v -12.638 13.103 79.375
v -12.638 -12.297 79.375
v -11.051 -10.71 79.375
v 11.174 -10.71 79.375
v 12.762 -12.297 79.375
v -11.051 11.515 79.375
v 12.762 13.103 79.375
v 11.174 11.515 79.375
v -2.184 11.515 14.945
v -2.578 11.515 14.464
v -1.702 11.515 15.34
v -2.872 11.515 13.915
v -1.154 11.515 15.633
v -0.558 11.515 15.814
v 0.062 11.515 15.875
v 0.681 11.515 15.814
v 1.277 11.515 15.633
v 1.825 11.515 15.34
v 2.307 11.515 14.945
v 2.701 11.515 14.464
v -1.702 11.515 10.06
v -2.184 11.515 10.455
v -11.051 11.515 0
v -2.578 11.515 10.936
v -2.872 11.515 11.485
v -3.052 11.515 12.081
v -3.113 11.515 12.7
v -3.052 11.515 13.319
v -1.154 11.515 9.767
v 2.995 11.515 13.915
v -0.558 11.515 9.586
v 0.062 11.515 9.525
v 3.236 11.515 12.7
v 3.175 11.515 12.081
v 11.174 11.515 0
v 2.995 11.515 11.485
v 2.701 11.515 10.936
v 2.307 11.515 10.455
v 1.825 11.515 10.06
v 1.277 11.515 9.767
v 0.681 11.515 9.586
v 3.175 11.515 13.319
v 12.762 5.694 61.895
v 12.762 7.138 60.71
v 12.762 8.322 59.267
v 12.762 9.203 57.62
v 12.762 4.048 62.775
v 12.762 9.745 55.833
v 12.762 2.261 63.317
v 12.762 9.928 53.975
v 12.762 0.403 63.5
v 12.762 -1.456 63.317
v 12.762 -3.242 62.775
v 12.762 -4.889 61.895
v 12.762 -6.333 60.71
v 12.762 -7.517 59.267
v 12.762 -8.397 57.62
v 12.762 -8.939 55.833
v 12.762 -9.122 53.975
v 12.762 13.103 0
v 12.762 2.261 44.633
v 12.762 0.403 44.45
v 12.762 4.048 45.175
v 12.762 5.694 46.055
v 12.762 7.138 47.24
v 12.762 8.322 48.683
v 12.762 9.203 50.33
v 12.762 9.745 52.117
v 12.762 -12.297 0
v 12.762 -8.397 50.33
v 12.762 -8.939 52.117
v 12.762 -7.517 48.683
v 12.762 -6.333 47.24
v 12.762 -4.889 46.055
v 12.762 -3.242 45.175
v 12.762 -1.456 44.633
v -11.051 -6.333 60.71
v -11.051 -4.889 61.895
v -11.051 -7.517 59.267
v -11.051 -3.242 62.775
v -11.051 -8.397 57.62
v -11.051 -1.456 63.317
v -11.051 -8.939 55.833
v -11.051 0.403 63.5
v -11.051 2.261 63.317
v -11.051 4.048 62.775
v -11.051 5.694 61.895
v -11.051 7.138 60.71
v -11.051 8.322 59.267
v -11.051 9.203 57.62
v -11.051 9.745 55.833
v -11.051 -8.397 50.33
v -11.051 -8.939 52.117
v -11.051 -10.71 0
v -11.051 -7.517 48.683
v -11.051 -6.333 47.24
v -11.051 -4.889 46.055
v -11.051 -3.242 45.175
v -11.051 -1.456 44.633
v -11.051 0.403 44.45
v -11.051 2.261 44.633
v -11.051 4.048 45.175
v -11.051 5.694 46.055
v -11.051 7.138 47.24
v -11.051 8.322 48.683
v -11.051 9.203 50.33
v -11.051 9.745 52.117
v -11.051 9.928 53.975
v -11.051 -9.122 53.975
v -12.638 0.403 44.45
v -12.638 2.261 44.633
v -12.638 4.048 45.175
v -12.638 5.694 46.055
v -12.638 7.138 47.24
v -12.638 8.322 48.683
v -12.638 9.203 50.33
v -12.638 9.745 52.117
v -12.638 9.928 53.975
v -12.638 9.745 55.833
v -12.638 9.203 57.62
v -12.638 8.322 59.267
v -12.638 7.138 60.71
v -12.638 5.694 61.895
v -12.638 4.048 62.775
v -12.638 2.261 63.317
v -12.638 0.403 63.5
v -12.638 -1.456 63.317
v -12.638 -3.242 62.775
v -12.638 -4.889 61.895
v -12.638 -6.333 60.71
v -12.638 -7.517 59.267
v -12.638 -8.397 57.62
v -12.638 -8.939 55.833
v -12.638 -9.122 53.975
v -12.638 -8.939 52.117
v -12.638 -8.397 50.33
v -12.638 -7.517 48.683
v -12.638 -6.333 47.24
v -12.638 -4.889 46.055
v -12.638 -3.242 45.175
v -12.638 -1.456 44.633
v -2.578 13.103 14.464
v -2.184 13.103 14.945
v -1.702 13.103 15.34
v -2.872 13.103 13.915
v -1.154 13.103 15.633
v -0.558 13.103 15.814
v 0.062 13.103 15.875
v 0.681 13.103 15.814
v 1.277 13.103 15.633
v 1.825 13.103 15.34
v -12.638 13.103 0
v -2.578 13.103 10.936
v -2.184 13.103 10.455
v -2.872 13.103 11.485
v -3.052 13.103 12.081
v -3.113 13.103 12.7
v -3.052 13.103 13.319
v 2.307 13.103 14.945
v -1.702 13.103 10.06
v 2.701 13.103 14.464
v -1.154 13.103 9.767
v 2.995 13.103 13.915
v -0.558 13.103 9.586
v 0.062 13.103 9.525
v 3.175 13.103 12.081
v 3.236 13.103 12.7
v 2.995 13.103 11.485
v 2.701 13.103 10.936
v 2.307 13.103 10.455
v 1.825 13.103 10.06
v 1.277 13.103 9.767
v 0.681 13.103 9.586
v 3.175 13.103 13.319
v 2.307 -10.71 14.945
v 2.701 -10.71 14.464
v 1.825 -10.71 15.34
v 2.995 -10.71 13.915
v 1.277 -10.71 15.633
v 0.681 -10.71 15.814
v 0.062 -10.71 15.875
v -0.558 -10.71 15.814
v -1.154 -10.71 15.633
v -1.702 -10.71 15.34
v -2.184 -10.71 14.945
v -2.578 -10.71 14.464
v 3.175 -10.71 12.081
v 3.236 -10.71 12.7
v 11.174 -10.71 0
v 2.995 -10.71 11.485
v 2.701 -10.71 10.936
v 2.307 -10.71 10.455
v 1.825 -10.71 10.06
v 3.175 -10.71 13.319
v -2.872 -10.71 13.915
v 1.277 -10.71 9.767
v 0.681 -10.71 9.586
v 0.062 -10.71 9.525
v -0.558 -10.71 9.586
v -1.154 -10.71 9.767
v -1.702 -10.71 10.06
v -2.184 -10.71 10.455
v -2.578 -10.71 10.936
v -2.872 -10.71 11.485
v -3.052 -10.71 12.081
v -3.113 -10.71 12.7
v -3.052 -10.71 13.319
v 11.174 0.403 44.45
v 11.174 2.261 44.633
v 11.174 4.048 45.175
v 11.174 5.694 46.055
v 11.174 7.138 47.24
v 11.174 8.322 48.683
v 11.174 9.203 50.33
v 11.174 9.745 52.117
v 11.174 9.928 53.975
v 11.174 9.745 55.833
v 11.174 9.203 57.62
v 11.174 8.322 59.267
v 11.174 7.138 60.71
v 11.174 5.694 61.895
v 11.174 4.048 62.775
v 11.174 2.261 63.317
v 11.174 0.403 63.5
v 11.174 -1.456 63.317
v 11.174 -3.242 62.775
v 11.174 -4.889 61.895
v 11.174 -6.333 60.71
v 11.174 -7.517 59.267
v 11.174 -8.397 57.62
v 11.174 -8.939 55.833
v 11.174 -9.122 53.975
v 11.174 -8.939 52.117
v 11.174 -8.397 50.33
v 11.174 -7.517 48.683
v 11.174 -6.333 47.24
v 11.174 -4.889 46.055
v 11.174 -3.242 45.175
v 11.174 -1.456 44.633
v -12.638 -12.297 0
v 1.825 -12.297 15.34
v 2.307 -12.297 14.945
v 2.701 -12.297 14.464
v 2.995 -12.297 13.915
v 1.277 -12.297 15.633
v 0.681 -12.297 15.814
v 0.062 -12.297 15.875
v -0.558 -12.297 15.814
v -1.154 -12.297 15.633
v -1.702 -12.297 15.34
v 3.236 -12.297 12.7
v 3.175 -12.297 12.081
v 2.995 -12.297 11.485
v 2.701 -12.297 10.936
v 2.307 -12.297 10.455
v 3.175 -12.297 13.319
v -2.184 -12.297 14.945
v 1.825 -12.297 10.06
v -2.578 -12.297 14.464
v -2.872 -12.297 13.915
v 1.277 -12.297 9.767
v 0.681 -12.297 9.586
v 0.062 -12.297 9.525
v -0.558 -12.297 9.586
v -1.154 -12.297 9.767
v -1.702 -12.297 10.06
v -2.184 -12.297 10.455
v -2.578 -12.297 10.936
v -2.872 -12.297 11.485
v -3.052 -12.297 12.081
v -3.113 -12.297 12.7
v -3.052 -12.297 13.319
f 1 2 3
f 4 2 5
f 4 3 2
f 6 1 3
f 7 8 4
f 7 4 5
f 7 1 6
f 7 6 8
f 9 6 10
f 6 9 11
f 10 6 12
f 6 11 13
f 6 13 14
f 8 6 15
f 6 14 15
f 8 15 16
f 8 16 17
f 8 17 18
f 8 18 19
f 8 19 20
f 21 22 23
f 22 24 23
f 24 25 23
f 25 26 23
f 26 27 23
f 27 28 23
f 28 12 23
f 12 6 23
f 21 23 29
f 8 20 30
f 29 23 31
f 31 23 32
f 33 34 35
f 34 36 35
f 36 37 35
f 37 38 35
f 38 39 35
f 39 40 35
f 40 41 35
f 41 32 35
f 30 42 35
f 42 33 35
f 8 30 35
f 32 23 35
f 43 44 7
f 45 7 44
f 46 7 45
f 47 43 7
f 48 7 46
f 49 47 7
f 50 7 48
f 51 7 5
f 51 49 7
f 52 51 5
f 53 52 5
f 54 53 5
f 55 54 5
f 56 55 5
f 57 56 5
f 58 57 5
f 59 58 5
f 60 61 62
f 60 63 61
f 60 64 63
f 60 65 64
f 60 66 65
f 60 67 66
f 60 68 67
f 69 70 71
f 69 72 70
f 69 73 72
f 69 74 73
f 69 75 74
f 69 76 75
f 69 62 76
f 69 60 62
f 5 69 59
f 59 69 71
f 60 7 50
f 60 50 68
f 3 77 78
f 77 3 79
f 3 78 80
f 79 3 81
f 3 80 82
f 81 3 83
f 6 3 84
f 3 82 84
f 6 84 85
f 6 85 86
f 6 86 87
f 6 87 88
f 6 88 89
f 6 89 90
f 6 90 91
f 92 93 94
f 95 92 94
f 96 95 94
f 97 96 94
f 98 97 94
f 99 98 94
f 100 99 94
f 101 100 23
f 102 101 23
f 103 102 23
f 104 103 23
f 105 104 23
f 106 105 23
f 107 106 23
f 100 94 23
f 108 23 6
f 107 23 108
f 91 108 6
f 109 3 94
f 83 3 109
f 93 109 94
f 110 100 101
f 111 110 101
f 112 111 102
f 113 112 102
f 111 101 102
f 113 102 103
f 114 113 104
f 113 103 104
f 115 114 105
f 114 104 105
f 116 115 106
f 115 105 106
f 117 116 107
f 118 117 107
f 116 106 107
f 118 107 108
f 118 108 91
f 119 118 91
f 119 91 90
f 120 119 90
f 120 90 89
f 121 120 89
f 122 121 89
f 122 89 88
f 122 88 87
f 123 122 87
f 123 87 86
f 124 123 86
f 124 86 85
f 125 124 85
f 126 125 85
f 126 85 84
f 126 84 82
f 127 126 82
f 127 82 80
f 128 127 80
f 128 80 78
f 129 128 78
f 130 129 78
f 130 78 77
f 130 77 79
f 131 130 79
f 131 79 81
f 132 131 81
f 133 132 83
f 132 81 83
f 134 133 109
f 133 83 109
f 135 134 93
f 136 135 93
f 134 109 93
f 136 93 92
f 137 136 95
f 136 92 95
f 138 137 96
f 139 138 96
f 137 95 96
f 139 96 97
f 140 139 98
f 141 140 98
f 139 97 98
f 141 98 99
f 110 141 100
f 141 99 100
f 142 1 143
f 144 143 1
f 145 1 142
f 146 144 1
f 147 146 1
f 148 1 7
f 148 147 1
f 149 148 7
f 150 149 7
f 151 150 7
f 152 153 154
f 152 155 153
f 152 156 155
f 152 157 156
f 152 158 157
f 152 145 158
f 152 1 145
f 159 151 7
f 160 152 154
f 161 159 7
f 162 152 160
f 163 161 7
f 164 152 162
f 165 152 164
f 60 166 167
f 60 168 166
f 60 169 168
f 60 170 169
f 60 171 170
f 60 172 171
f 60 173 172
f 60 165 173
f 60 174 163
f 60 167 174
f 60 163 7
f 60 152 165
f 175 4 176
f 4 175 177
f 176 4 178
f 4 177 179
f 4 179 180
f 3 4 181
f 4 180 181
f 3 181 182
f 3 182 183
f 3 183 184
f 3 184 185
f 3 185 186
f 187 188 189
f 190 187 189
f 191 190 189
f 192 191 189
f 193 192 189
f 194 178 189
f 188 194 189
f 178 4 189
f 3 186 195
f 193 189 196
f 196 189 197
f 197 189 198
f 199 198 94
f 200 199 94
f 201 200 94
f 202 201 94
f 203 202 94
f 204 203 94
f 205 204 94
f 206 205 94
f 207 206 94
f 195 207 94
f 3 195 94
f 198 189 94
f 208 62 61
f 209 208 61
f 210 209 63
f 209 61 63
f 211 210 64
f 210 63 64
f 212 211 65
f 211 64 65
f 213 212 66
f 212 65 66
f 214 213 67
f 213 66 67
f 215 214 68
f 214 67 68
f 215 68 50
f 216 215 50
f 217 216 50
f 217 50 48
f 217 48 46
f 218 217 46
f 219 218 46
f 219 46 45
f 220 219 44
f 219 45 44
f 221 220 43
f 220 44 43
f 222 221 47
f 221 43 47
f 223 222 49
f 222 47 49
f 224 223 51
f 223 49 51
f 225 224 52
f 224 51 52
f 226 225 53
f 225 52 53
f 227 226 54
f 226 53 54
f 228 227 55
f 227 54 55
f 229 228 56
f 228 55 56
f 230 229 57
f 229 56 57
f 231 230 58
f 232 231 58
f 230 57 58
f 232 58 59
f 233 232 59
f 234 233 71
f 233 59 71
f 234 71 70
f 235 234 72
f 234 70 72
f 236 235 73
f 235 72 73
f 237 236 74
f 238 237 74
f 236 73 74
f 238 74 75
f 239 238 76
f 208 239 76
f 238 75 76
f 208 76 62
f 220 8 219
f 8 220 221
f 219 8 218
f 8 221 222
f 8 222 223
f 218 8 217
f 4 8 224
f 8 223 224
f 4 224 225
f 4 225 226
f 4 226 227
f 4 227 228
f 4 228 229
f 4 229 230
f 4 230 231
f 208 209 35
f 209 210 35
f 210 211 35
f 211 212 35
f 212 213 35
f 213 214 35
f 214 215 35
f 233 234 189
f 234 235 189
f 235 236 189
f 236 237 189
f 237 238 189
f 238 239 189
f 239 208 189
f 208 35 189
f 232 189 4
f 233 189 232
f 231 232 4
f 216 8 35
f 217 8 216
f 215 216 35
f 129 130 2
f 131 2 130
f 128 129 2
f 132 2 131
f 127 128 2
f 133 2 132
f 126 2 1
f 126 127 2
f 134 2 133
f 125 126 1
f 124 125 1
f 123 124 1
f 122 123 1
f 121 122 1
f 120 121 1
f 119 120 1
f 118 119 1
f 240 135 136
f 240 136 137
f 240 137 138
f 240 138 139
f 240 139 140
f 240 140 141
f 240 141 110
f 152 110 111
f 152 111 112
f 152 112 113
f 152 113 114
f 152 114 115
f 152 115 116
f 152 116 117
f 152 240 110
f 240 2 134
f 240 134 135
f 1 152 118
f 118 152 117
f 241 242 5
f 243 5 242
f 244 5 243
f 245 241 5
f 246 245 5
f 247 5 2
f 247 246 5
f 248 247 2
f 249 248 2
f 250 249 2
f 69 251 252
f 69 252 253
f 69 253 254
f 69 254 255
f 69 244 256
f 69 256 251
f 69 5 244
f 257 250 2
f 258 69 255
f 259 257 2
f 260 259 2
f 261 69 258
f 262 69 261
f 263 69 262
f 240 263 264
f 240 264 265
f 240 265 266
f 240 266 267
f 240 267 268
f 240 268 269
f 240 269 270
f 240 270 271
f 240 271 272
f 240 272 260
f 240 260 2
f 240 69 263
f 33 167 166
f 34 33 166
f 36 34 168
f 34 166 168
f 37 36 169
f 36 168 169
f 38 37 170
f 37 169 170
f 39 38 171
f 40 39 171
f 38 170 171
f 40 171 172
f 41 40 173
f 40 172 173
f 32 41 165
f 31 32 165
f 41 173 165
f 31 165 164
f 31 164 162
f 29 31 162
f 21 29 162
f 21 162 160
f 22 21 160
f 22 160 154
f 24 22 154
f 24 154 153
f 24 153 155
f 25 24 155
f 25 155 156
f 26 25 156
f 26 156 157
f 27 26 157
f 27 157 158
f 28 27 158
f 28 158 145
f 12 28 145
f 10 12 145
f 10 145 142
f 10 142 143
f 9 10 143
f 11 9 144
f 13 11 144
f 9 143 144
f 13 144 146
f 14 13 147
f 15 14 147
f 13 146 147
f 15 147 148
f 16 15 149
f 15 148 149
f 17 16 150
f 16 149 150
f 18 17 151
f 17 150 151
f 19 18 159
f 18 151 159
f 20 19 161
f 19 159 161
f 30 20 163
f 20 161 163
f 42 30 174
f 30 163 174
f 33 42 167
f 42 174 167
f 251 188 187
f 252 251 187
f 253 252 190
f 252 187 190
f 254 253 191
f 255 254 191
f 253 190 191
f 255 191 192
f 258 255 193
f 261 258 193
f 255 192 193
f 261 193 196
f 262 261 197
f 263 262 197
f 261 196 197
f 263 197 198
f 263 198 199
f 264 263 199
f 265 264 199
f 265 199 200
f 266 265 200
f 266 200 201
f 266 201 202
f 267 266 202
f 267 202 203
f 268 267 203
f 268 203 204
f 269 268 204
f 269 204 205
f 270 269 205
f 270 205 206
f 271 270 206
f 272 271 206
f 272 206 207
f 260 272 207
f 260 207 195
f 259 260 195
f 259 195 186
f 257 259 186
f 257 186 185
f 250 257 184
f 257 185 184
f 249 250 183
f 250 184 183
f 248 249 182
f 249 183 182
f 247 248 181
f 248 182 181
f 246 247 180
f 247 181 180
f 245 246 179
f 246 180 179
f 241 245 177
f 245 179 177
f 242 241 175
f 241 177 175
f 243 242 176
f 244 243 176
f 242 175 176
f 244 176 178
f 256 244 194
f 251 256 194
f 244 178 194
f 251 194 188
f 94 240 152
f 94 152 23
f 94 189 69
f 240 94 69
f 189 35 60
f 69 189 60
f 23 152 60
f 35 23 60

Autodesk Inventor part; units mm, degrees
ref_plane "YZ Plane" through (0, 0, 0) normal (1, 0, 0) x (0, 1, 0)
ref_plane "XZ Plane" through (0, 0, 0) normal (0, 1, 0) x (-1, 0, 0)
ref_plane "XY Plane" through (0, 0, 0) normal (0, 0, 1) x (1, 0, 0)
sketch "Sketch1" plane through (0, 0, 0) normal (0, 0, 1) x (1, 0, 0)
  line L0 (-11.051, 11.5151) -> (11.174, 11.5151)
  line L1 (11.174, 11.5151) -> (11.174, -10.7099)
  line L2 (11.174, -10.7099) -> (-11.051, -10.7099)
  line L3 (-11.051, -10.7099) -> (-11.051, 11.5151)
  line L4 (-12.6385, 13.1026) -> (12.7615, 13.1026)
  line L5 (12.7615, 13.1026) -> (12.7615, -12.2974)
  line L6 (12.7615, -12.2974) -> (-12.6385, -12.2974)
  line L7 (-12.6385, -12.2974) -> (-12.6385, 13.1026)
  point P0 (0, 0)
  dimension "d0" = 25.4
  dimension "d1" = 25.4
  dimension "d2" = 1.5875
  dimension "d3" = 1.5875
  dimension "d4" = 1.5875
  dimension "d5" = 1.5875
extrude "Extrusion1" add sketch "Sketch1" along normal blind 79.375
sketch "Sketch2" plane through (12.7615, -12.2974, 0) normal (1, 0, 0) x (0, 0, -1)
  circle A0 centre (-53.975, 12.7) radius 9.525
  line L0 (0, 0) -> (-79.375, 0) projected
  line L1 (-79.375, 0) -> (-79.375, 25.4) projected
  circle A1 centre (-33.655, 12.7) radius 3.175
  circle A2 centre (-74.295, 12.7) radius 3.175
  point P0 (0, 12.2974)
  dimension "d8" = 19.05
  dimension "d11" = 12.7
  dimension "d12" = 25.4
  dimension "d13" = 20.32
  dimension "d14" = 6.35
  dimension "d15" = 6.35
  dimension "d16" = 20.32
extrude "Extrusion2" cut sketch "Sketch2" against normal through all contours A0
sketch "Sketch3" plane through (-12.6385, 13.1026, 0) normal (0, 1, 0) x (1, 0, 0)
  circle A0 centre (12.7, -12.7) radius 3.175
  line L0 (0, 0) -> (0, -79.375) projected
  line L1 (25.4, 0) -> (0, 0) projected
  point P0 (12.6385, 0)
  dimension "d17" = 6.35
  dimension "d18" = 12.7
  dimension "d19" = 12.7
extrude "Extrusion3" cut sketch "Sketch3" against normal through all
equation "\"d3\" = d2"
equation "\"d4\" = d2"
equation "\"d5\" = d2"
equation "\"d16\" = d13"
properties part number "Diff Side Bar"
